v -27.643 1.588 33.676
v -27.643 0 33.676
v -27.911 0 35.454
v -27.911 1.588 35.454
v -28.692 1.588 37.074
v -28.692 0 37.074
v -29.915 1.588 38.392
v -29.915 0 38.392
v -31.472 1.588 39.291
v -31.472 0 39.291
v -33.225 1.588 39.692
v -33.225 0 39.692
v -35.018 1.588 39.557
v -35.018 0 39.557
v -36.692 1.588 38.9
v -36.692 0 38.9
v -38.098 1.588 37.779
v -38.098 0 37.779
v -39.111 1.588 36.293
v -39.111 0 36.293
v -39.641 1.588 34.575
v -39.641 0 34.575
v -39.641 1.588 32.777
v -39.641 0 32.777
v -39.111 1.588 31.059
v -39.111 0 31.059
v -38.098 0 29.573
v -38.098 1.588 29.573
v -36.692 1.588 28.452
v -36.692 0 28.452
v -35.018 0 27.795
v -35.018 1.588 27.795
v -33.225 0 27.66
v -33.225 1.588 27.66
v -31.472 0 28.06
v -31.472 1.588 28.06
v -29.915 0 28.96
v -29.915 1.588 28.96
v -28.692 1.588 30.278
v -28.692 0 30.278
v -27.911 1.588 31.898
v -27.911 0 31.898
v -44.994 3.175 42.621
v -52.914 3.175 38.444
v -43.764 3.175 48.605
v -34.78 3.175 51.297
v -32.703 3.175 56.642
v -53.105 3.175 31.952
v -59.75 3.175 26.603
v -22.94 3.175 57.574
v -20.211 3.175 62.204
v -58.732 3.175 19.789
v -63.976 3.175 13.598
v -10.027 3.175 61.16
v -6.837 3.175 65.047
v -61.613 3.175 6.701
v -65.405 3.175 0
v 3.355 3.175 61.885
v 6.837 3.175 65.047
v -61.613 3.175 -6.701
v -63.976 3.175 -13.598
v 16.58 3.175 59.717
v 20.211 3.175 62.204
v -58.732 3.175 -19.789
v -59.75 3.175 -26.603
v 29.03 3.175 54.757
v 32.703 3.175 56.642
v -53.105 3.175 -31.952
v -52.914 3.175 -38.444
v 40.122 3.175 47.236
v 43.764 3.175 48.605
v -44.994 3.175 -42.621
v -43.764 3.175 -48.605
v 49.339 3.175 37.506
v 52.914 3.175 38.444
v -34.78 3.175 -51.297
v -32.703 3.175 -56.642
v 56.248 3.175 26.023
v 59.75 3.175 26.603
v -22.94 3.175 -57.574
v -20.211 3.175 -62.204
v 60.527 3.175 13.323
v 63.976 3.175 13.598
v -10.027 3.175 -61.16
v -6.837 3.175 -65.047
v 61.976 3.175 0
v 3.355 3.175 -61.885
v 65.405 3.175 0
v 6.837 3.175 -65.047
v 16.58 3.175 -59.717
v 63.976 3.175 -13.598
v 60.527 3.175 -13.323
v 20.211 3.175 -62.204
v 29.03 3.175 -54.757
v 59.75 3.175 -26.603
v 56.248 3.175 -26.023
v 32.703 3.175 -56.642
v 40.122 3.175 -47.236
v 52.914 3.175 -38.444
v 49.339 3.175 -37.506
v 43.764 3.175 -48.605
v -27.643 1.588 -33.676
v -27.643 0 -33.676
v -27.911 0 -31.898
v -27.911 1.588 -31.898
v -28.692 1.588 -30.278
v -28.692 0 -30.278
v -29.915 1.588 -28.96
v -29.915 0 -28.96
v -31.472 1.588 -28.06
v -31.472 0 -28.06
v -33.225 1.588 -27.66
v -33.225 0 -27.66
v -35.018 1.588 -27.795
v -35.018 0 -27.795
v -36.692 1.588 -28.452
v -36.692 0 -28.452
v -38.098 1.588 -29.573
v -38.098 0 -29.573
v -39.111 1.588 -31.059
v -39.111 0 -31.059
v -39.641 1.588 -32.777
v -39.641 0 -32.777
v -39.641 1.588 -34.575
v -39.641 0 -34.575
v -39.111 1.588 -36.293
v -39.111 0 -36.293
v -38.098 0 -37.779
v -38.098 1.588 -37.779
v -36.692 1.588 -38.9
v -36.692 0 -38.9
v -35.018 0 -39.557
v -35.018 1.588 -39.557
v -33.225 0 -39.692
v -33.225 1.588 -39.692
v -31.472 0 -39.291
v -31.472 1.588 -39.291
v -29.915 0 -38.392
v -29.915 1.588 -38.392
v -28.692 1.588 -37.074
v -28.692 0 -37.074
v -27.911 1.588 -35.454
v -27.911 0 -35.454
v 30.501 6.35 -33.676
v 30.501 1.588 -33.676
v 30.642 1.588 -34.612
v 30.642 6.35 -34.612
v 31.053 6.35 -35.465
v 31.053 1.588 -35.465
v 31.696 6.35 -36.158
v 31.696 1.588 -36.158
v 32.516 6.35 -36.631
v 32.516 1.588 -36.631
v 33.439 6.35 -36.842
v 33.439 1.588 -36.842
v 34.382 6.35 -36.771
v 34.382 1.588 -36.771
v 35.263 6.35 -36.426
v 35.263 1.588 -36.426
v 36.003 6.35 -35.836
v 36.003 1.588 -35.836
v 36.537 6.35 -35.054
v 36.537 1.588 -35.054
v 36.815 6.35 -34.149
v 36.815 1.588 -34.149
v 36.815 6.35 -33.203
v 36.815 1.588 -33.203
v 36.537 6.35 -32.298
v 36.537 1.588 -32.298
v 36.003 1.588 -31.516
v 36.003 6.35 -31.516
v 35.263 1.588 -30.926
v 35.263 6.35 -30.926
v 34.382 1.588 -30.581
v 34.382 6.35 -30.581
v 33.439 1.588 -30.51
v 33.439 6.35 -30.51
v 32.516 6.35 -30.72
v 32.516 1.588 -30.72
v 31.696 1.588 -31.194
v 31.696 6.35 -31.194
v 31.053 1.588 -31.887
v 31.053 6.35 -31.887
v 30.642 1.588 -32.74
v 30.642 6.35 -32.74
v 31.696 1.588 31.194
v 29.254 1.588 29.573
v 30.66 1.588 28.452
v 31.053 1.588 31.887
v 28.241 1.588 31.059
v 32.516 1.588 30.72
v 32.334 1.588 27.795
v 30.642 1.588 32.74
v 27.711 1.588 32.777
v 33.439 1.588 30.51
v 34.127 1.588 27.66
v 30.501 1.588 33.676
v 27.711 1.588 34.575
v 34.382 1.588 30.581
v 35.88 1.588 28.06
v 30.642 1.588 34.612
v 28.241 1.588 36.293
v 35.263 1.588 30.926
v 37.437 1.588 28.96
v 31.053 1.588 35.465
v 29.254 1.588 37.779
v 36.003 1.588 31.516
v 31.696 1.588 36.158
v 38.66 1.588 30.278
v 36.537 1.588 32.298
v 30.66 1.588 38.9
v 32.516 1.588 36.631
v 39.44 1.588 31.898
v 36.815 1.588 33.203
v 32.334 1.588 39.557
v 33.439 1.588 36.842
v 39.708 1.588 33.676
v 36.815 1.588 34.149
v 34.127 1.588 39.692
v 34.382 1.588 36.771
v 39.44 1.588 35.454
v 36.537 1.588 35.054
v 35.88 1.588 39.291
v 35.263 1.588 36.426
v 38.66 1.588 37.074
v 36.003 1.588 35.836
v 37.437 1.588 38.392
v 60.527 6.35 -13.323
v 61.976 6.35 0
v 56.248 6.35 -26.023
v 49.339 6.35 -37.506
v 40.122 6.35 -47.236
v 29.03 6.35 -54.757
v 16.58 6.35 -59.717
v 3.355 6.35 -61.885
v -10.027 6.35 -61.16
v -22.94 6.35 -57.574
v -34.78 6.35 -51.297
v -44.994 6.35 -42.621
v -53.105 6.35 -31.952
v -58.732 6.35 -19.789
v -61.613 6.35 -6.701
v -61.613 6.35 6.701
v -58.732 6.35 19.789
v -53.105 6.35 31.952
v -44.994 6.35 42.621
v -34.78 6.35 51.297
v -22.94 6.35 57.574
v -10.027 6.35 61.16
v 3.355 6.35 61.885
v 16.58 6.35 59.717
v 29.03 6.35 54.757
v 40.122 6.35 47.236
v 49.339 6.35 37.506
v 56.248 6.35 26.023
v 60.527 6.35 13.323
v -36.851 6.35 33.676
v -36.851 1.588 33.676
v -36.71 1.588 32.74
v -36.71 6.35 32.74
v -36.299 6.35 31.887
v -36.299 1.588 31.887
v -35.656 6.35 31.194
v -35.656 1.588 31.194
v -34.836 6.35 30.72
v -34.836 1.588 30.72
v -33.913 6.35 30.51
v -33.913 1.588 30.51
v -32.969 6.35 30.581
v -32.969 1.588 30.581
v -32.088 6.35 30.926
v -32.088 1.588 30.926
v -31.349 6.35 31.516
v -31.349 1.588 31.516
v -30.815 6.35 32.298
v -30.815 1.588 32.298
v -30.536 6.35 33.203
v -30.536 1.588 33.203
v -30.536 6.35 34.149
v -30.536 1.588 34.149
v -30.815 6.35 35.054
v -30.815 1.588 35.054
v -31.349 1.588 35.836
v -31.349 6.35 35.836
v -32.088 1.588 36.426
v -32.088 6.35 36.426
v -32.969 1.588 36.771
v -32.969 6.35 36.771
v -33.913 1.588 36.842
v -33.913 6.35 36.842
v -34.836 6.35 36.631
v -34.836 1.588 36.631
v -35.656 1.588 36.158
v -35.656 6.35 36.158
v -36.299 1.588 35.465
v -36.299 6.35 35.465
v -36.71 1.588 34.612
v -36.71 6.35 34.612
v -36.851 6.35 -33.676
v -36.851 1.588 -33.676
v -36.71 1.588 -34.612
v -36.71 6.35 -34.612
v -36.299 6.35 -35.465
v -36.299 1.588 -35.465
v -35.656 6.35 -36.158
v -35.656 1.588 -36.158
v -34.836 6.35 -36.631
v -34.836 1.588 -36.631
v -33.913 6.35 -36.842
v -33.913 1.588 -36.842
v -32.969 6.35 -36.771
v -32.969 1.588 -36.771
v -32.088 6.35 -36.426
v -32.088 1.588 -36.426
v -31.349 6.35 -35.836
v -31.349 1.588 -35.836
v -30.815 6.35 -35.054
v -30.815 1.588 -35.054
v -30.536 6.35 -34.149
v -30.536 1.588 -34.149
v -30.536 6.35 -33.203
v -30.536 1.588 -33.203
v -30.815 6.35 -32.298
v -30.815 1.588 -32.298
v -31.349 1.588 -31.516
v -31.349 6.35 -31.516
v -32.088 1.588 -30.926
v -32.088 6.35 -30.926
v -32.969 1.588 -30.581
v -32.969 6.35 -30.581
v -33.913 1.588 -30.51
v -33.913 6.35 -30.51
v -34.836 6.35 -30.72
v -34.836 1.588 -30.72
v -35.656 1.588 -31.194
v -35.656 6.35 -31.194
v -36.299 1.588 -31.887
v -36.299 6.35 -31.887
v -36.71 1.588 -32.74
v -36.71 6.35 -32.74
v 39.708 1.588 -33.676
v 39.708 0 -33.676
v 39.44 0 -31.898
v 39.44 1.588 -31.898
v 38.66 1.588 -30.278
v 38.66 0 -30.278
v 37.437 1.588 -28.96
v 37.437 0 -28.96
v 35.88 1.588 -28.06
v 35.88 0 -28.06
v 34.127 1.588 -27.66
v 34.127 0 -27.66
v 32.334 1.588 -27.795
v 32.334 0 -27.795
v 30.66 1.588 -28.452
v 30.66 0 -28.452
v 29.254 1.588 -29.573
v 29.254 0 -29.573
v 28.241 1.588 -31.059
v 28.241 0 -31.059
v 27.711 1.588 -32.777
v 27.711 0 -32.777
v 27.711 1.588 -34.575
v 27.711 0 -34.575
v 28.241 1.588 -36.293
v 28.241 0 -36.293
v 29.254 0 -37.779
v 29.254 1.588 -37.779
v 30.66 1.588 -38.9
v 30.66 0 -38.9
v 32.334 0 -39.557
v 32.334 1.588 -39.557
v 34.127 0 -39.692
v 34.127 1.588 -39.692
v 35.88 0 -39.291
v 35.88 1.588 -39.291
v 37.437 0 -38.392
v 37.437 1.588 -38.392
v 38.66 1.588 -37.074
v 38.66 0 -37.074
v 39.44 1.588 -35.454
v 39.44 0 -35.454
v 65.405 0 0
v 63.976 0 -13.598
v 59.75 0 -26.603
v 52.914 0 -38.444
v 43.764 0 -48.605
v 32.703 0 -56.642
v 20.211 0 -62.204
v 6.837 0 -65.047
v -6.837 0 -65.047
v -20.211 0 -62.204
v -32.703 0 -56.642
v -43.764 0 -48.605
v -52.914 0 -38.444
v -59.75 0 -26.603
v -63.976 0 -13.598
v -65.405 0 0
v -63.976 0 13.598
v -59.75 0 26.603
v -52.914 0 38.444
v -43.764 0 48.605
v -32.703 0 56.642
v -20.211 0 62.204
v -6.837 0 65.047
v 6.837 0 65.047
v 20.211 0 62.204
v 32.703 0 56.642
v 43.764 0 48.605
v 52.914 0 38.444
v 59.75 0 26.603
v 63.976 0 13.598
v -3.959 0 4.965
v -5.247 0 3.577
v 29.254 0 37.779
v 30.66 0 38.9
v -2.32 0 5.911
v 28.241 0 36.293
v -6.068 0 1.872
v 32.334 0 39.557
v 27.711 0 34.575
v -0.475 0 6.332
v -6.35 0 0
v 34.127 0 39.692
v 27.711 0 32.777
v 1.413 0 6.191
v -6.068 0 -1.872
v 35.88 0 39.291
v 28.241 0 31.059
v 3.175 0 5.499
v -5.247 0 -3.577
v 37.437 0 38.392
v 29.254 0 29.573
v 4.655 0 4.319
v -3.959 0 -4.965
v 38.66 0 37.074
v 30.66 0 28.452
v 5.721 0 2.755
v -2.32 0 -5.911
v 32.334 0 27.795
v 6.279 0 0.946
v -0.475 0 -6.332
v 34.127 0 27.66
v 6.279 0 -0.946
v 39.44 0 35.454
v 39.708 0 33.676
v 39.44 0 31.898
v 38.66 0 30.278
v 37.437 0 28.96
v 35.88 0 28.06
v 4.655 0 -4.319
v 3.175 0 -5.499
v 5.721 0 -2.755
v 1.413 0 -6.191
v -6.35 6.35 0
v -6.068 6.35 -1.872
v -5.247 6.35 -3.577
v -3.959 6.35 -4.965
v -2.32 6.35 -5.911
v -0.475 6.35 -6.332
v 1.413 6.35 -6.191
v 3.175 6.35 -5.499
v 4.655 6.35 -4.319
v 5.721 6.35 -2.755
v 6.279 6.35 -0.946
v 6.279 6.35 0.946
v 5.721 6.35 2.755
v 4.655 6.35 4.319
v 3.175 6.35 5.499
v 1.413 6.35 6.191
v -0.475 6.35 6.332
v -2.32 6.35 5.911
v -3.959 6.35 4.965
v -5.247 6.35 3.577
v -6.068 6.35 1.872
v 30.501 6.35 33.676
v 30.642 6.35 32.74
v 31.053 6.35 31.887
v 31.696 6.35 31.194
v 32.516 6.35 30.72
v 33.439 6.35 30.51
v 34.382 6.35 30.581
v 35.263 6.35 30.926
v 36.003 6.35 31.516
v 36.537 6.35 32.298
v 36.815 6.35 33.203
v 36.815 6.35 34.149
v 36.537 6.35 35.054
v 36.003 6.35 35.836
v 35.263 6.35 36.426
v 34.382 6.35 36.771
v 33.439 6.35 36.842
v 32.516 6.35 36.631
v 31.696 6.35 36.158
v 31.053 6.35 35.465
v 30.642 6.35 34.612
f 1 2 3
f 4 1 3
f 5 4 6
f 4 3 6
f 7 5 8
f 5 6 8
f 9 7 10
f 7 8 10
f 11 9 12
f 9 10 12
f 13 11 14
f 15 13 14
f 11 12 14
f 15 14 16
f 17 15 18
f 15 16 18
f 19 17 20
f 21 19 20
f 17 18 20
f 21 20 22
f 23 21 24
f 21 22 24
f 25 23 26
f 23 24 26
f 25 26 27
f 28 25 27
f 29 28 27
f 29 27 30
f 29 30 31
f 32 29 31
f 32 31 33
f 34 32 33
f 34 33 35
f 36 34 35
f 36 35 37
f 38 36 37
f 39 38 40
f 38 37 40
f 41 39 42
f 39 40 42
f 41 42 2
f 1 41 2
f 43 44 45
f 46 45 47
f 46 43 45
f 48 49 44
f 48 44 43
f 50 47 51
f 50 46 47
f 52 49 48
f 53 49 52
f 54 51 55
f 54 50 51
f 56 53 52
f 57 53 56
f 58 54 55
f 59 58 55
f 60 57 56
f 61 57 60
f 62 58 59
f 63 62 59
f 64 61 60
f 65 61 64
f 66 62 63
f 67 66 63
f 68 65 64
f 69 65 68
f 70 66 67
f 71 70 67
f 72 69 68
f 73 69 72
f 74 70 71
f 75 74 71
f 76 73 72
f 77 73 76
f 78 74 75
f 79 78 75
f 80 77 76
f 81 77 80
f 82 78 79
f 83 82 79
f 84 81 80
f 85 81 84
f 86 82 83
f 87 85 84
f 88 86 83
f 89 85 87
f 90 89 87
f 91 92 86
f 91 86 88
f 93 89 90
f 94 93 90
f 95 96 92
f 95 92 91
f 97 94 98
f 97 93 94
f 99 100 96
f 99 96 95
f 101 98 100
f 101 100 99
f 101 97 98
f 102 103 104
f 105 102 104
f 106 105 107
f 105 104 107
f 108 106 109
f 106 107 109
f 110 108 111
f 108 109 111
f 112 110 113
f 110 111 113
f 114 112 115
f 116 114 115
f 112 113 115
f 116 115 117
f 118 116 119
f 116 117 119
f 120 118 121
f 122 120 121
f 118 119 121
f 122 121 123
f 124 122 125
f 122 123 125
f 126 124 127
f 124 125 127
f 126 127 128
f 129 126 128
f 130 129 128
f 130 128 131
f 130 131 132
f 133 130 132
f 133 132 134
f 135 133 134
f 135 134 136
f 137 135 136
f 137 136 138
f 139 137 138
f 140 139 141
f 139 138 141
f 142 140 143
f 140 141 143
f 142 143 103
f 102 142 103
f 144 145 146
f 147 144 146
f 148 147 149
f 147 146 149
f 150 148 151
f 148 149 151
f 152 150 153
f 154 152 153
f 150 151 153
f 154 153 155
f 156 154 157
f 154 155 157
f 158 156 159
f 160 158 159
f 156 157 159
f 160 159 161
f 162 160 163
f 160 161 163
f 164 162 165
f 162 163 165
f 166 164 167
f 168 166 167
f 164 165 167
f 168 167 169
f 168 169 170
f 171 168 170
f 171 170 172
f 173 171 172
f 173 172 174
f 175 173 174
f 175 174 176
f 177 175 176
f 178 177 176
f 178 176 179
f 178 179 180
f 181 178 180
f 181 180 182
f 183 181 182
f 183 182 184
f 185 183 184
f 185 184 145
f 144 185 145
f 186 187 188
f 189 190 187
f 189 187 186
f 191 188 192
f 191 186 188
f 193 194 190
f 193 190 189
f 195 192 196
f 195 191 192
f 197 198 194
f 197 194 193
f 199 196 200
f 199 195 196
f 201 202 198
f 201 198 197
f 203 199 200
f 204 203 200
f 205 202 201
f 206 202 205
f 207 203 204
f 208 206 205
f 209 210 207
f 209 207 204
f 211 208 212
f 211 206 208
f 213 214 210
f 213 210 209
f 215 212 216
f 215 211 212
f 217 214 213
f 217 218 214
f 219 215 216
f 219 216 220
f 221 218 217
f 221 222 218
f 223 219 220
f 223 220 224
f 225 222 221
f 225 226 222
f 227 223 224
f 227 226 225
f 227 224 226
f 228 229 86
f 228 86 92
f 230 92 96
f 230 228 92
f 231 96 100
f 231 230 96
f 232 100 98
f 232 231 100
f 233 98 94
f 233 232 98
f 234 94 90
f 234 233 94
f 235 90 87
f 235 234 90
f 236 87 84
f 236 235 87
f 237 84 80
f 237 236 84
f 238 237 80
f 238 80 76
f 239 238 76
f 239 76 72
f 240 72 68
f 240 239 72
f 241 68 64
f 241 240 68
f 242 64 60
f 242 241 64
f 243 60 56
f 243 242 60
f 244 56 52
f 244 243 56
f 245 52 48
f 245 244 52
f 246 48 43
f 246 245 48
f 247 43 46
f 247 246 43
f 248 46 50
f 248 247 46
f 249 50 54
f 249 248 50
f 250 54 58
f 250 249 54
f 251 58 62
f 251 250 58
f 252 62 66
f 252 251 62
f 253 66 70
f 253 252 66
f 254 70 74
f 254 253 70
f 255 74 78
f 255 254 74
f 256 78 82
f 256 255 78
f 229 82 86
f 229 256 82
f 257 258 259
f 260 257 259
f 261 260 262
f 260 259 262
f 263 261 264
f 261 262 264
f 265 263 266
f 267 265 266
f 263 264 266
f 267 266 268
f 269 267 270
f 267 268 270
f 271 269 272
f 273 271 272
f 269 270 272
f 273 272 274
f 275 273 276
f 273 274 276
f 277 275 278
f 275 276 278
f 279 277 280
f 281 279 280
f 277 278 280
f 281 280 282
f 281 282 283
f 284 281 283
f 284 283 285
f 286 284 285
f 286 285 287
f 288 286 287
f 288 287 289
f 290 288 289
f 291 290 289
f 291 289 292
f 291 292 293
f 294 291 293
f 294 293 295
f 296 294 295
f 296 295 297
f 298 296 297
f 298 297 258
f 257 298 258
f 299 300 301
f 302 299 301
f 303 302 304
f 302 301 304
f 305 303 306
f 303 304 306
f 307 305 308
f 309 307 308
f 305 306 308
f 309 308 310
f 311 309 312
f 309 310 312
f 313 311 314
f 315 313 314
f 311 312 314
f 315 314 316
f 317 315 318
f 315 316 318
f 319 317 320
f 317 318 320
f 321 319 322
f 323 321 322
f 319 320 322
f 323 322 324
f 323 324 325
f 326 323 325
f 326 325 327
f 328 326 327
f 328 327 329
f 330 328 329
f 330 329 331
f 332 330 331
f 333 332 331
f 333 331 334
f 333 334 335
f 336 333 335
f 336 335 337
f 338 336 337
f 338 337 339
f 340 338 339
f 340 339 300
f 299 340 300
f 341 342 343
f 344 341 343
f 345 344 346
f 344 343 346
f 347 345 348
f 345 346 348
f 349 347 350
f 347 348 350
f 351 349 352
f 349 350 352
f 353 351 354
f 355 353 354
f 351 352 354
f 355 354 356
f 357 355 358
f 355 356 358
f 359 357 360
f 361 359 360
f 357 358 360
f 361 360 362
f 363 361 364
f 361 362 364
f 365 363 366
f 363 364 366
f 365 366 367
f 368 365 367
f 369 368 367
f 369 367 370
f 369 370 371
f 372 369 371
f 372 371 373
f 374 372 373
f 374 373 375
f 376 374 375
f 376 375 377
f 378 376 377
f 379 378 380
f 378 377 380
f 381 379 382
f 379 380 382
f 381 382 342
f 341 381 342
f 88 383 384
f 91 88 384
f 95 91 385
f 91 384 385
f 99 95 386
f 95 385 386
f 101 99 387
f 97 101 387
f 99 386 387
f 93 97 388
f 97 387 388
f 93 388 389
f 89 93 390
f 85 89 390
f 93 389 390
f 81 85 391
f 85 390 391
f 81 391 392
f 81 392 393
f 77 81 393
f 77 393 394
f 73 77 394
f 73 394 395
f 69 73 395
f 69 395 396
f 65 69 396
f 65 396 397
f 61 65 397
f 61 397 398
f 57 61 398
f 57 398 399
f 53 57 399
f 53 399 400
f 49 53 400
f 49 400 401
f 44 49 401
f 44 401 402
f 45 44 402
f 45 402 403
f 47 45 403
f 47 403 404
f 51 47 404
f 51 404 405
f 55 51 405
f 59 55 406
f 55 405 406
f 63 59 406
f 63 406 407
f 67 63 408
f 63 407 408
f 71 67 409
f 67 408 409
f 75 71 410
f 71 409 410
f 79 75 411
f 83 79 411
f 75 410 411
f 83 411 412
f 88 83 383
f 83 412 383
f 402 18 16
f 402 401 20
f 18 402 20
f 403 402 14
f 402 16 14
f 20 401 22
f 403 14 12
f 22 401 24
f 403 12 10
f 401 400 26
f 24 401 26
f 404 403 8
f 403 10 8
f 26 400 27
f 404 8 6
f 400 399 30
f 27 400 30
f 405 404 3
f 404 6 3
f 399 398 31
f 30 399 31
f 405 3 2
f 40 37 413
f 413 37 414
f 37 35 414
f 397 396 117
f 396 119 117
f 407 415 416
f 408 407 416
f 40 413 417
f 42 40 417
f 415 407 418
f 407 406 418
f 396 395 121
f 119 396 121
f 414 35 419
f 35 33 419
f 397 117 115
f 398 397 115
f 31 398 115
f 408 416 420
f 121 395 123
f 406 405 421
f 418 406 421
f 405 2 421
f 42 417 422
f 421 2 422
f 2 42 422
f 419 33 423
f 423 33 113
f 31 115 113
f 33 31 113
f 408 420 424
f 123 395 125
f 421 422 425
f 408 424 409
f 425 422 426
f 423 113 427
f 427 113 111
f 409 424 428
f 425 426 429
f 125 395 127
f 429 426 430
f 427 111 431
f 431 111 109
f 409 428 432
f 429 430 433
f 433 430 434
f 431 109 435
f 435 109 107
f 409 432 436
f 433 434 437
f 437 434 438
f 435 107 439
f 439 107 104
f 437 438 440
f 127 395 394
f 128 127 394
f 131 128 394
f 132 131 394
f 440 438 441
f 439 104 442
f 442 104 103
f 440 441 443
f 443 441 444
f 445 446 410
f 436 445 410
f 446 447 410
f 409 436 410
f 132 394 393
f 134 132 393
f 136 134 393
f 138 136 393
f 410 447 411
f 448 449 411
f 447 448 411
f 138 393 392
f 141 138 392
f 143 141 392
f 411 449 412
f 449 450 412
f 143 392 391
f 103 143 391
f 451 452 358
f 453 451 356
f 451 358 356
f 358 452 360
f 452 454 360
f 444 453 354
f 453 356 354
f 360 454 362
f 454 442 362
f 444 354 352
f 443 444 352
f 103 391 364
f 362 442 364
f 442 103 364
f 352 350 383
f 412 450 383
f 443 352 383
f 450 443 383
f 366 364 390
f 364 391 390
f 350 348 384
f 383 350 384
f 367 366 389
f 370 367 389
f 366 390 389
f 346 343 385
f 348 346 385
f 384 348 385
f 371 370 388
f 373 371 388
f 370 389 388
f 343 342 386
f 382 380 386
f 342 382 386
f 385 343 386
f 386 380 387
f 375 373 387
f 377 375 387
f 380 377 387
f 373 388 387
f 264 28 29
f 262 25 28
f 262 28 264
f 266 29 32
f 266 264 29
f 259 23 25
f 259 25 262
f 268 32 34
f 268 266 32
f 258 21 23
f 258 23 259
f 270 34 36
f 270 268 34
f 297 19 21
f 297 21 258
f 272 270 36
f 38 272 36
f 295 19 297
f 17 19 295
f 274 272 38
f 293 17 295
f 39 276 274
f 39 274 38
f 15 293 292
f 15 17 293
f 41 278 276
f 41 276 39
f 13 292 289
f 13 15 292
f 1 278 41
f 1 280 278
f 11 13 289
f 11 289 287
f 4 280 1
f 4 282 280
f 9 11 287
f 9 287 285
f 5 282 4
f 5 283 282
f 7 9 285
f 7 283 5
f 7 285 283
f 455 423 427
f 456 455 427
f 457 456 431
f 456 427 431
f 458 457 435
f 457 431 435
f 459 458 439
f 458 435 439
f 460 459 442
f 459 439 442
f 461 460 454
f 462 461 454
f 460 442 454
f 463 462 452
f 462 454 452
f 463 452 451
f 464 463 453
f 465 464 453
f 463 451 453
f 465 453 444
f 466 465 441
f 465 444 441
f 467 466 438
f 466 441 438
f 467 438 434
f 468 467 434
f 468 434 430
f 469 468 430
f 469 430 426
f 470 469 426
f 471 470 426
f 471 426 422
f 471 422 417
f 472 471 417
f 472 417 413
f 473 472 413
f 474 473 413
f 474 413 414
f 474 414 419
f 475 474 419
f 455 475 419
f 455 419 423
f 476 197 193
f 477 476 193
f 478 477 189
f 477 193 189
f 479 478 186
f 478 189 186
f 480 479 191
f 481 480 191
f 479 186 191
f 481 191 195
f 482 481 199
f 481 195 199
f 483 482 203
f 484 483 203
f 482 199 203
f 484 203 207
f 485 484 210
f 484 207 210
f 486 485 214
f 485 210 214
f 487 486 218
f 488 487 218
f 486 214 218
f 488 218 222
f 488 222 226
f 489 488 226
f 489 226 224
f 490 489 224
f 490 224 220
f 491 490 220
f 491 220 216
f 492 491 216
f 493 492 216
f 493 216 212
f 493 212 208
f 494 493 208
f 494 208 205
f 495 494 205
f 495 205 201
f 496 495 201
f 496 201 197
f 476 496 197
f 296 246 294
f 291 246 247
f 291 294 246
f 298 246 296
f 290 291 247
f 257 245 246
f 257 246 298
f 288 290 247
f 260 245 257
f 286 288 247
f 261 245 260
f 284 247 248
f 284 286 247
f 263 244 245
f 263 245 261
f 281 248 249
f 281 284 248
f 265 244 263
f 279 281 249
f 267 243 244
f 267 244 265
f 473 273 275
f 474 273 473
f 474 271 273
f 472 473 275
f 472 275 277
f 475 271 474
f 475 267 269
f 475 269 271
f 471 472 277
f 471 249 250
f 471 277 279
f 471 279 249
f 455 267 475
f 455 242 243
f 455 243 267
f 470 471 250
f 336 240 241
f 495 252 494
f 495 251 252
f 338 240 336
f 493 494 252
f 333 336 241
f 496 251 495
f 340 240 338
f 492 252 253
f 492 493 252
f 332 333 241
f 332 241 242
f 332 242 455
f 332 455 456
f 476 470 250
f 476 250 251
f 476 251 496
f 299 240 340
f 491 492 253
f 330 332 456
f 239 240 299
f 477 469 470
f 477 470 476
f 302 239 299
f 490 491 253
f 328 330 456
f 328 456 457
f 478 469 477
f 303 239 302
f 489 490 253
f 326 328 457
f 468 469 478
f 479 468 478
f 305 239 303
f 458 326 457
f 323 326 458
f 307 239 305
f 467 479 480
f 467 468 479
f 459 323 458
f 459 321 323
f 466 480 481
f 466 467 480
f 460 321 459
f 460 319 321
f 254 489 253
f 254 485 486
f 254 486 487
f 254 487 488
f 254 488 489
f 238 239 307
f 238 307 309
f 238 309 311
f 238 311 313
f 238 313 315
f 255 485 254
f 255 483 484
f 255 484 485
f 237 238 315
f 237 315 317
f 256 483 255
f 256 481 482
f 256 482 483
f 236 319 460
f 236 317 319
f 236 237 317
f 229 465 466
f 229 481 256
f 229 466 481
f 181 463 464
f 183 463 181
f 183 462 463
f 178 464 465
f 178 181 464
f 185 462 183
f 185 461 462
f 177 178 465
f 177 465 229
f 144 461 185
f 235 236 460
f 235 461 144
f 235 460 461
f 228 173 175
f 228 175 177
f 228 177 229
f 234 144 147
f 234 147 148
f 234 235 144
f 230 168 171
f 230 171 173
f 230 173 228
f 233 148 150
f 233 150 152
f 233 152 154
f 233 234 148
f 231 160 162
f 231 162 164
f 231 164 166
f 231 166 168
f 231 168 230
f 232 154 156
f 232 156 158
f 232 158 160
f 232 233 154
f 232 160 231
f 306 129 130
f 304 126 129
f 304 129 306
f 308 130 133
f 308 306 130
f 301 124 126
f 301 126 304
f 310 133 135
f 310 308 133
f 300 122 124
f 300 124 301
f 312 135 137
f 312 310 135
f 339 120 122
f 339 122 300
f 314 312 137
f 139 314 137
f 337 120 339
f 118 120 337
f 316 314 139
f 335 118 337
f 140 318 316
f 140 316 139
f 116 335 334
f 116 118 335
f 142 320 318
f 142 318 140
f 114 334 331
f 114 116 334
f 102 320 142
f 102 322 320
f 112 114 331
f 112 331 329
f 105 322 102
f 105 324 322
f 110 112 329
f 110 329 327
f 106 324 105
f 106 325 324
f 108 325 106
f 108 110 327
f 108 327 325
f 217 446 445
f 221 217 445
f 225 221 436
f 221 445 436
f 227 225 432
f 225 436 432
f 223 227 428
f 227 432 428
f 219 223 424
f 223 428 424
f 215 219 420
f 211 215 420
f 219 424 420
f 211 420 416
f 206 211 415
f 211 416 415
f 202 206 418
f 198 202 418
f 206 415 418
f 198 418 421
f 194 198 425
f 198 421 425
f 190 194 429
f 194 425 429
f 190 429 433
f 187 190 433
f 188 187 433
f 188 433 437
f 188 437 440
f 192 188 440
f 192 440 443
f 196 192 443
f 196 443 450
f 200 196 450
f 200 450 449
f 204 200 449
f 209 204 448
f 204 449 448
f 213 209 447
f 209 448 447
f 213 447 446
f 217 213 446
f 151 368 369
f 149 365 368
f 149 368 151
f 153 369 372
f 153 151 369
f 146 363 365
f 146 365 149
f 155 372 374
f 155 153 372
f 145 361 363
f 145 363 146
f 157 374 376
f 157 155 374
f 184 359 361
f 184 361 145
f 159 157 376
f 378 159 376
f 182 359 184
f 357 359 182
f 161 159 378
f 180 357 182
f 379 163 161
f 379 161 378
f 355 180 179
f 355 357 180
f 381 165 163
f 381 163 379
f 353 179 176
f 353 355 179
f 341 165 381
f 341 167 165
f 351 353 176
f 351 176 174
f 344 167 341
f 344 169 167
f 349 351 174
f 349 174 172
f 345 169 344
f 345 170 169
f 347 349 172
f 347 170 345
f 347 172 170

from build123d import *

# Parameters (mm, degrees)
SKETCH2_R                   = 65.405
BOSS_EXTRUDE1_DEPTH         = 6.35
SKETCH4_R                   = 65.405
SKETCH4_R_2                 = 61.976
CUT_EXTRUDE1_DEPTH          = 3.175
F_1_4_0_25_DIAMETER_HOLE1_D = 6.35
F_1_2_0_5_DIAMETER_HOLE1_D  = 12.7
SKETCH9_R                   = 6.0325
CUT_EXTRUDE2_DEPTH          = 1.5875


with BuildPart() as part:
    # Sketch2 → Boss-Extrude1 (new body)
    with BuildSketch(Plane(origin=(0, 0, 0), x_dir=(1, 0, 0), z_dir=(0, 1, 0))):
        Circle(SKETCH2_R)
    extrude(amount=BOSS_EXTRUDE1_DEPTH)

    # Sketch4 → Cut-Extrude1 (cut)
    with BuildSketch(Plane(origin=(0, 6.35, 0), x_dir=(1, 0, 0), z_dir=(0, 1, 0))):
        Circle(SKETCH4_R)
        Circle(SKETCH4_R_2, mode=Mode.SUBTRACT)
    extrude(amount=-CUT_EXTRUDE1_DEPTH, mode=Mode.SUBTRACT)

    # 1/4 (0.25) Diameter Hole1 (through all)
    with Locations(Plane(origin=(0, 6.35, 0), x_dir=(1, 0, 0), z_dir=(0, 1, 0))):
        with Locations((-33.675960454, 33.675960454), (-33.675960454, -33.675960454), (33.675960454, 33.675960454), (33.675960454, -33.675960454)):
            Hole(F_1_4_0_25_DIAMETER_HOLE1_D / 2)

    # 1/2 (0.5) Diameter Hole1 (through all)
    with Locations(Plane(origin=(0, 6.35, 0), x_dir=(1, 0, 0), z_dir=(0, 1, 0))):
        with Locations((0, 0)):
            Hole(F_1_2_0_5_DIAMETER_HOLE1_D / 2)

    # Sketch9 → Cut-Extrude2 (cut)
    with BuildSketch(Plane.XZ):
        with Locations((-33.675960454, 33.675960454)):
            Circle(SKETCH9_R)
        with Locations((33.675960454, 33.675960454)):
            Circle(SKETCH9_R)
        with Locations((33.675960454, -33.675960454)):
            Circle(SKETCH9_R)
        with Locations((-33.675960454, -33.675960454)):
            Circle(SKETCH9_R)
    extrude(amount=-CUT_EXTRUDE2_DEPTH, mode=Mode.SUBTRACT)


solid = part.part
